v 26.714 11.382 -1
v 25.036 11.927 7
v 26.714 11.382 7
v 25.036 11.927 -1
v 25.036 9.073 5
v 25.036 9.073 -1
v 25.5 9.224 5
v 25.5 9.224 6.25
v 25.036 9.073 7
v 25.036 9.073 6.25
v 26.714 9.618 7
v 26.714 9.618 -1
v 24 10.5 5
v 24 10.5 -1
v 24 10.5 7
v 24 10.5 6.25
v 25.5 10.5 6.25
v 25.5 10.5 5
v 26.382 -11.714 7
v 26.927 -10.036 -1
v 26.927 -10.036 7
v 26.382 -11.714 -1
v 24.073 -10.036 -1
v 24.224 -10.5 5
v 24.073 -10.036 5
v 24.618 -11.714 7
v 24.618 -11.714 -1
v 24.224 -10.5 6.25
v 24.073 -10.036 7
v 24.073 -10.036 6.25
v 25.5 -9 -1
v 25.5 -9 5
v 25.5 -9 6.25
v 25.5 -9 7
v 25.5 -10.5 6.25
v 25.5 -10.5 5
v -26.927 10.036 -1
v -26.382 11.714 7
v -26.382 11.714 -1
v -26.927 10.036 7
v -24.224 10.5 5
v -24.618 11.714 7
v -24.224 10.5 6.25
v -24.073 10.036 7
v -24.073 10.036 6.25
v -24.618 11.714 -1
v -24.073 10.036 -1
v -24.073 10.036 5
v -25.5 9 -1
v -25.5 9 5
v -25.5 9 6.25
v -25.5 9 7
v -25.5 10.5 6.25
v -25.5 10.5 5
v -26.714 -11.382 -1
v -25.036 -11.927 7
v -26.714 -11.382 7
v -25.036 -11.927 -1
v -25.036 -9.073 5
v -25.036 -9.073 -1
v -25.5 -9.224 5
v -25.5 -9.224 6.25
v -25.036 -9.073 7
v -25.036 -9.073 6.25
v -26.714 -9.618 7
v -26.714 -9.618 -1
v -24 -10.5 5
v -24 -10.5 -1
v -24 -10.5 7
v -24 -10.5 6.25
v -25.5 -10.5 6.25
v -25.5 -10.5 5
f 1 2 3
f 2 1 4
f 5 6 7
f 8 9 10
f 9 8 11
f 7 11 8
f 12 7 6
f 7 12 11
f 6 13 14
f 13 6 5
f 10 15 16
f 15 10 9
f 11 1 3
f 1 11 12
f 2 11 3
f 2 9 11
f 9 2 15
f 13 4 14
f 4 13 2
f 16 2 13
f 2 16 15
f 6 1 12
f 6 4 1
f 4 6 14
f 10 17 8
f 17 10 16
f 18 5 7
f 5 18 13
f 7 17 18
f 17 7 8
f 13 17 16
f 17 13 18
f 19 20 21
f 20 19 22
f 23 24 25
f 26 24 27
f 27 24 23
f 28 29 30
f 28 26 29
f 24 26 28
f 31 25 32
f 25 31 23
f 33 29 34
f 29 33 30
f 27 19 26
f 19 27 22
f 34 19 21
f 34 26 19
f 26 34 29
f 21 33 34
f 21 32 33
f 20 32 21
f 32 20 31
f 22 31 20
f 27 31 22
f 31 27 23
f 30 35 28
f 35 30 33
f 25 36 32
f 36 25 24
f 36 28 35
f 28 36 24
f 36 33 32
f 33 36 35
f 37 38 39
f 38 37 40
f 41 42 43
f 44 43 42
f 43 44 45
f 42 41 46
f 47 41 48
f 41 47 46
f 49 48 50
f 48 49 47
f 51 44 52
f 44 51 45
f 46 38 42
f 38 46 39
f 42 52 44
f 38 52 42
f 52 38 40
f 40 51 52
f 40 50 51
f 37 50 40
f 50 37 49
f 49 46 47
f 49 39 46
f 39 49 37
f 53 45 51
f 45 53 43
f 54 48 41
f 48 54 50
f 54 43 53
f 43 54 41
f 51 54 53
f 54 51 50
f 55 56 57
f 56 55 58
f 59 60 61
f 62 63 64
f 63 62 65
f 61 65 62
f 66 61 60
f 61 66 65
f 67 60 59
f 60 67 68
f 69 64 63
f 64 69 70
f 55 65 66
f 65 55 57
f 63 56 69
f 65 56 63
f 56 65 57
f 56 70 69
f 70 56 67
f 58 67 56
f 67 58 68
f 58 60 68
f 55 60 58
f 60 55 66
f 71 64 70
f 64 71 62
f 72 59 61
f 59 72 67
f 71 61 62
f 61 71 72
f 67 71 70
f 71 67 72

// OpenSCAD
//Base([55,60,3]);
translate([0,0,3]) Posts([51,21]);

module Base(size) {
    cube(size, center = true);
}

module Posts(location) {
    x = location[0]/2;
    y = location[1]/2;
    translate([x,y])
        rotate([0,0,180])
        Post(h = 8, r = 1.5);
    translate([x,-y])
        rotate([0,0,90])
        Post(h = 8, r = 1.5);
    translate([-x,y])
        rotate([0,0,270])
        Post(h = 8, r = 1.5);
    translate([-x,-y])
        rotate([0,0,0])
        Post(h = 8, r = 1.5);
}

module Post(h = 5, r = 1.5) {
    //translate([0,0,h/2])
    difference() {
        cylinder(h = h, r = r, center = true);
        translate([0,0,(h/2)-2])
        cube([r, r, 1.25]);
    }
}
